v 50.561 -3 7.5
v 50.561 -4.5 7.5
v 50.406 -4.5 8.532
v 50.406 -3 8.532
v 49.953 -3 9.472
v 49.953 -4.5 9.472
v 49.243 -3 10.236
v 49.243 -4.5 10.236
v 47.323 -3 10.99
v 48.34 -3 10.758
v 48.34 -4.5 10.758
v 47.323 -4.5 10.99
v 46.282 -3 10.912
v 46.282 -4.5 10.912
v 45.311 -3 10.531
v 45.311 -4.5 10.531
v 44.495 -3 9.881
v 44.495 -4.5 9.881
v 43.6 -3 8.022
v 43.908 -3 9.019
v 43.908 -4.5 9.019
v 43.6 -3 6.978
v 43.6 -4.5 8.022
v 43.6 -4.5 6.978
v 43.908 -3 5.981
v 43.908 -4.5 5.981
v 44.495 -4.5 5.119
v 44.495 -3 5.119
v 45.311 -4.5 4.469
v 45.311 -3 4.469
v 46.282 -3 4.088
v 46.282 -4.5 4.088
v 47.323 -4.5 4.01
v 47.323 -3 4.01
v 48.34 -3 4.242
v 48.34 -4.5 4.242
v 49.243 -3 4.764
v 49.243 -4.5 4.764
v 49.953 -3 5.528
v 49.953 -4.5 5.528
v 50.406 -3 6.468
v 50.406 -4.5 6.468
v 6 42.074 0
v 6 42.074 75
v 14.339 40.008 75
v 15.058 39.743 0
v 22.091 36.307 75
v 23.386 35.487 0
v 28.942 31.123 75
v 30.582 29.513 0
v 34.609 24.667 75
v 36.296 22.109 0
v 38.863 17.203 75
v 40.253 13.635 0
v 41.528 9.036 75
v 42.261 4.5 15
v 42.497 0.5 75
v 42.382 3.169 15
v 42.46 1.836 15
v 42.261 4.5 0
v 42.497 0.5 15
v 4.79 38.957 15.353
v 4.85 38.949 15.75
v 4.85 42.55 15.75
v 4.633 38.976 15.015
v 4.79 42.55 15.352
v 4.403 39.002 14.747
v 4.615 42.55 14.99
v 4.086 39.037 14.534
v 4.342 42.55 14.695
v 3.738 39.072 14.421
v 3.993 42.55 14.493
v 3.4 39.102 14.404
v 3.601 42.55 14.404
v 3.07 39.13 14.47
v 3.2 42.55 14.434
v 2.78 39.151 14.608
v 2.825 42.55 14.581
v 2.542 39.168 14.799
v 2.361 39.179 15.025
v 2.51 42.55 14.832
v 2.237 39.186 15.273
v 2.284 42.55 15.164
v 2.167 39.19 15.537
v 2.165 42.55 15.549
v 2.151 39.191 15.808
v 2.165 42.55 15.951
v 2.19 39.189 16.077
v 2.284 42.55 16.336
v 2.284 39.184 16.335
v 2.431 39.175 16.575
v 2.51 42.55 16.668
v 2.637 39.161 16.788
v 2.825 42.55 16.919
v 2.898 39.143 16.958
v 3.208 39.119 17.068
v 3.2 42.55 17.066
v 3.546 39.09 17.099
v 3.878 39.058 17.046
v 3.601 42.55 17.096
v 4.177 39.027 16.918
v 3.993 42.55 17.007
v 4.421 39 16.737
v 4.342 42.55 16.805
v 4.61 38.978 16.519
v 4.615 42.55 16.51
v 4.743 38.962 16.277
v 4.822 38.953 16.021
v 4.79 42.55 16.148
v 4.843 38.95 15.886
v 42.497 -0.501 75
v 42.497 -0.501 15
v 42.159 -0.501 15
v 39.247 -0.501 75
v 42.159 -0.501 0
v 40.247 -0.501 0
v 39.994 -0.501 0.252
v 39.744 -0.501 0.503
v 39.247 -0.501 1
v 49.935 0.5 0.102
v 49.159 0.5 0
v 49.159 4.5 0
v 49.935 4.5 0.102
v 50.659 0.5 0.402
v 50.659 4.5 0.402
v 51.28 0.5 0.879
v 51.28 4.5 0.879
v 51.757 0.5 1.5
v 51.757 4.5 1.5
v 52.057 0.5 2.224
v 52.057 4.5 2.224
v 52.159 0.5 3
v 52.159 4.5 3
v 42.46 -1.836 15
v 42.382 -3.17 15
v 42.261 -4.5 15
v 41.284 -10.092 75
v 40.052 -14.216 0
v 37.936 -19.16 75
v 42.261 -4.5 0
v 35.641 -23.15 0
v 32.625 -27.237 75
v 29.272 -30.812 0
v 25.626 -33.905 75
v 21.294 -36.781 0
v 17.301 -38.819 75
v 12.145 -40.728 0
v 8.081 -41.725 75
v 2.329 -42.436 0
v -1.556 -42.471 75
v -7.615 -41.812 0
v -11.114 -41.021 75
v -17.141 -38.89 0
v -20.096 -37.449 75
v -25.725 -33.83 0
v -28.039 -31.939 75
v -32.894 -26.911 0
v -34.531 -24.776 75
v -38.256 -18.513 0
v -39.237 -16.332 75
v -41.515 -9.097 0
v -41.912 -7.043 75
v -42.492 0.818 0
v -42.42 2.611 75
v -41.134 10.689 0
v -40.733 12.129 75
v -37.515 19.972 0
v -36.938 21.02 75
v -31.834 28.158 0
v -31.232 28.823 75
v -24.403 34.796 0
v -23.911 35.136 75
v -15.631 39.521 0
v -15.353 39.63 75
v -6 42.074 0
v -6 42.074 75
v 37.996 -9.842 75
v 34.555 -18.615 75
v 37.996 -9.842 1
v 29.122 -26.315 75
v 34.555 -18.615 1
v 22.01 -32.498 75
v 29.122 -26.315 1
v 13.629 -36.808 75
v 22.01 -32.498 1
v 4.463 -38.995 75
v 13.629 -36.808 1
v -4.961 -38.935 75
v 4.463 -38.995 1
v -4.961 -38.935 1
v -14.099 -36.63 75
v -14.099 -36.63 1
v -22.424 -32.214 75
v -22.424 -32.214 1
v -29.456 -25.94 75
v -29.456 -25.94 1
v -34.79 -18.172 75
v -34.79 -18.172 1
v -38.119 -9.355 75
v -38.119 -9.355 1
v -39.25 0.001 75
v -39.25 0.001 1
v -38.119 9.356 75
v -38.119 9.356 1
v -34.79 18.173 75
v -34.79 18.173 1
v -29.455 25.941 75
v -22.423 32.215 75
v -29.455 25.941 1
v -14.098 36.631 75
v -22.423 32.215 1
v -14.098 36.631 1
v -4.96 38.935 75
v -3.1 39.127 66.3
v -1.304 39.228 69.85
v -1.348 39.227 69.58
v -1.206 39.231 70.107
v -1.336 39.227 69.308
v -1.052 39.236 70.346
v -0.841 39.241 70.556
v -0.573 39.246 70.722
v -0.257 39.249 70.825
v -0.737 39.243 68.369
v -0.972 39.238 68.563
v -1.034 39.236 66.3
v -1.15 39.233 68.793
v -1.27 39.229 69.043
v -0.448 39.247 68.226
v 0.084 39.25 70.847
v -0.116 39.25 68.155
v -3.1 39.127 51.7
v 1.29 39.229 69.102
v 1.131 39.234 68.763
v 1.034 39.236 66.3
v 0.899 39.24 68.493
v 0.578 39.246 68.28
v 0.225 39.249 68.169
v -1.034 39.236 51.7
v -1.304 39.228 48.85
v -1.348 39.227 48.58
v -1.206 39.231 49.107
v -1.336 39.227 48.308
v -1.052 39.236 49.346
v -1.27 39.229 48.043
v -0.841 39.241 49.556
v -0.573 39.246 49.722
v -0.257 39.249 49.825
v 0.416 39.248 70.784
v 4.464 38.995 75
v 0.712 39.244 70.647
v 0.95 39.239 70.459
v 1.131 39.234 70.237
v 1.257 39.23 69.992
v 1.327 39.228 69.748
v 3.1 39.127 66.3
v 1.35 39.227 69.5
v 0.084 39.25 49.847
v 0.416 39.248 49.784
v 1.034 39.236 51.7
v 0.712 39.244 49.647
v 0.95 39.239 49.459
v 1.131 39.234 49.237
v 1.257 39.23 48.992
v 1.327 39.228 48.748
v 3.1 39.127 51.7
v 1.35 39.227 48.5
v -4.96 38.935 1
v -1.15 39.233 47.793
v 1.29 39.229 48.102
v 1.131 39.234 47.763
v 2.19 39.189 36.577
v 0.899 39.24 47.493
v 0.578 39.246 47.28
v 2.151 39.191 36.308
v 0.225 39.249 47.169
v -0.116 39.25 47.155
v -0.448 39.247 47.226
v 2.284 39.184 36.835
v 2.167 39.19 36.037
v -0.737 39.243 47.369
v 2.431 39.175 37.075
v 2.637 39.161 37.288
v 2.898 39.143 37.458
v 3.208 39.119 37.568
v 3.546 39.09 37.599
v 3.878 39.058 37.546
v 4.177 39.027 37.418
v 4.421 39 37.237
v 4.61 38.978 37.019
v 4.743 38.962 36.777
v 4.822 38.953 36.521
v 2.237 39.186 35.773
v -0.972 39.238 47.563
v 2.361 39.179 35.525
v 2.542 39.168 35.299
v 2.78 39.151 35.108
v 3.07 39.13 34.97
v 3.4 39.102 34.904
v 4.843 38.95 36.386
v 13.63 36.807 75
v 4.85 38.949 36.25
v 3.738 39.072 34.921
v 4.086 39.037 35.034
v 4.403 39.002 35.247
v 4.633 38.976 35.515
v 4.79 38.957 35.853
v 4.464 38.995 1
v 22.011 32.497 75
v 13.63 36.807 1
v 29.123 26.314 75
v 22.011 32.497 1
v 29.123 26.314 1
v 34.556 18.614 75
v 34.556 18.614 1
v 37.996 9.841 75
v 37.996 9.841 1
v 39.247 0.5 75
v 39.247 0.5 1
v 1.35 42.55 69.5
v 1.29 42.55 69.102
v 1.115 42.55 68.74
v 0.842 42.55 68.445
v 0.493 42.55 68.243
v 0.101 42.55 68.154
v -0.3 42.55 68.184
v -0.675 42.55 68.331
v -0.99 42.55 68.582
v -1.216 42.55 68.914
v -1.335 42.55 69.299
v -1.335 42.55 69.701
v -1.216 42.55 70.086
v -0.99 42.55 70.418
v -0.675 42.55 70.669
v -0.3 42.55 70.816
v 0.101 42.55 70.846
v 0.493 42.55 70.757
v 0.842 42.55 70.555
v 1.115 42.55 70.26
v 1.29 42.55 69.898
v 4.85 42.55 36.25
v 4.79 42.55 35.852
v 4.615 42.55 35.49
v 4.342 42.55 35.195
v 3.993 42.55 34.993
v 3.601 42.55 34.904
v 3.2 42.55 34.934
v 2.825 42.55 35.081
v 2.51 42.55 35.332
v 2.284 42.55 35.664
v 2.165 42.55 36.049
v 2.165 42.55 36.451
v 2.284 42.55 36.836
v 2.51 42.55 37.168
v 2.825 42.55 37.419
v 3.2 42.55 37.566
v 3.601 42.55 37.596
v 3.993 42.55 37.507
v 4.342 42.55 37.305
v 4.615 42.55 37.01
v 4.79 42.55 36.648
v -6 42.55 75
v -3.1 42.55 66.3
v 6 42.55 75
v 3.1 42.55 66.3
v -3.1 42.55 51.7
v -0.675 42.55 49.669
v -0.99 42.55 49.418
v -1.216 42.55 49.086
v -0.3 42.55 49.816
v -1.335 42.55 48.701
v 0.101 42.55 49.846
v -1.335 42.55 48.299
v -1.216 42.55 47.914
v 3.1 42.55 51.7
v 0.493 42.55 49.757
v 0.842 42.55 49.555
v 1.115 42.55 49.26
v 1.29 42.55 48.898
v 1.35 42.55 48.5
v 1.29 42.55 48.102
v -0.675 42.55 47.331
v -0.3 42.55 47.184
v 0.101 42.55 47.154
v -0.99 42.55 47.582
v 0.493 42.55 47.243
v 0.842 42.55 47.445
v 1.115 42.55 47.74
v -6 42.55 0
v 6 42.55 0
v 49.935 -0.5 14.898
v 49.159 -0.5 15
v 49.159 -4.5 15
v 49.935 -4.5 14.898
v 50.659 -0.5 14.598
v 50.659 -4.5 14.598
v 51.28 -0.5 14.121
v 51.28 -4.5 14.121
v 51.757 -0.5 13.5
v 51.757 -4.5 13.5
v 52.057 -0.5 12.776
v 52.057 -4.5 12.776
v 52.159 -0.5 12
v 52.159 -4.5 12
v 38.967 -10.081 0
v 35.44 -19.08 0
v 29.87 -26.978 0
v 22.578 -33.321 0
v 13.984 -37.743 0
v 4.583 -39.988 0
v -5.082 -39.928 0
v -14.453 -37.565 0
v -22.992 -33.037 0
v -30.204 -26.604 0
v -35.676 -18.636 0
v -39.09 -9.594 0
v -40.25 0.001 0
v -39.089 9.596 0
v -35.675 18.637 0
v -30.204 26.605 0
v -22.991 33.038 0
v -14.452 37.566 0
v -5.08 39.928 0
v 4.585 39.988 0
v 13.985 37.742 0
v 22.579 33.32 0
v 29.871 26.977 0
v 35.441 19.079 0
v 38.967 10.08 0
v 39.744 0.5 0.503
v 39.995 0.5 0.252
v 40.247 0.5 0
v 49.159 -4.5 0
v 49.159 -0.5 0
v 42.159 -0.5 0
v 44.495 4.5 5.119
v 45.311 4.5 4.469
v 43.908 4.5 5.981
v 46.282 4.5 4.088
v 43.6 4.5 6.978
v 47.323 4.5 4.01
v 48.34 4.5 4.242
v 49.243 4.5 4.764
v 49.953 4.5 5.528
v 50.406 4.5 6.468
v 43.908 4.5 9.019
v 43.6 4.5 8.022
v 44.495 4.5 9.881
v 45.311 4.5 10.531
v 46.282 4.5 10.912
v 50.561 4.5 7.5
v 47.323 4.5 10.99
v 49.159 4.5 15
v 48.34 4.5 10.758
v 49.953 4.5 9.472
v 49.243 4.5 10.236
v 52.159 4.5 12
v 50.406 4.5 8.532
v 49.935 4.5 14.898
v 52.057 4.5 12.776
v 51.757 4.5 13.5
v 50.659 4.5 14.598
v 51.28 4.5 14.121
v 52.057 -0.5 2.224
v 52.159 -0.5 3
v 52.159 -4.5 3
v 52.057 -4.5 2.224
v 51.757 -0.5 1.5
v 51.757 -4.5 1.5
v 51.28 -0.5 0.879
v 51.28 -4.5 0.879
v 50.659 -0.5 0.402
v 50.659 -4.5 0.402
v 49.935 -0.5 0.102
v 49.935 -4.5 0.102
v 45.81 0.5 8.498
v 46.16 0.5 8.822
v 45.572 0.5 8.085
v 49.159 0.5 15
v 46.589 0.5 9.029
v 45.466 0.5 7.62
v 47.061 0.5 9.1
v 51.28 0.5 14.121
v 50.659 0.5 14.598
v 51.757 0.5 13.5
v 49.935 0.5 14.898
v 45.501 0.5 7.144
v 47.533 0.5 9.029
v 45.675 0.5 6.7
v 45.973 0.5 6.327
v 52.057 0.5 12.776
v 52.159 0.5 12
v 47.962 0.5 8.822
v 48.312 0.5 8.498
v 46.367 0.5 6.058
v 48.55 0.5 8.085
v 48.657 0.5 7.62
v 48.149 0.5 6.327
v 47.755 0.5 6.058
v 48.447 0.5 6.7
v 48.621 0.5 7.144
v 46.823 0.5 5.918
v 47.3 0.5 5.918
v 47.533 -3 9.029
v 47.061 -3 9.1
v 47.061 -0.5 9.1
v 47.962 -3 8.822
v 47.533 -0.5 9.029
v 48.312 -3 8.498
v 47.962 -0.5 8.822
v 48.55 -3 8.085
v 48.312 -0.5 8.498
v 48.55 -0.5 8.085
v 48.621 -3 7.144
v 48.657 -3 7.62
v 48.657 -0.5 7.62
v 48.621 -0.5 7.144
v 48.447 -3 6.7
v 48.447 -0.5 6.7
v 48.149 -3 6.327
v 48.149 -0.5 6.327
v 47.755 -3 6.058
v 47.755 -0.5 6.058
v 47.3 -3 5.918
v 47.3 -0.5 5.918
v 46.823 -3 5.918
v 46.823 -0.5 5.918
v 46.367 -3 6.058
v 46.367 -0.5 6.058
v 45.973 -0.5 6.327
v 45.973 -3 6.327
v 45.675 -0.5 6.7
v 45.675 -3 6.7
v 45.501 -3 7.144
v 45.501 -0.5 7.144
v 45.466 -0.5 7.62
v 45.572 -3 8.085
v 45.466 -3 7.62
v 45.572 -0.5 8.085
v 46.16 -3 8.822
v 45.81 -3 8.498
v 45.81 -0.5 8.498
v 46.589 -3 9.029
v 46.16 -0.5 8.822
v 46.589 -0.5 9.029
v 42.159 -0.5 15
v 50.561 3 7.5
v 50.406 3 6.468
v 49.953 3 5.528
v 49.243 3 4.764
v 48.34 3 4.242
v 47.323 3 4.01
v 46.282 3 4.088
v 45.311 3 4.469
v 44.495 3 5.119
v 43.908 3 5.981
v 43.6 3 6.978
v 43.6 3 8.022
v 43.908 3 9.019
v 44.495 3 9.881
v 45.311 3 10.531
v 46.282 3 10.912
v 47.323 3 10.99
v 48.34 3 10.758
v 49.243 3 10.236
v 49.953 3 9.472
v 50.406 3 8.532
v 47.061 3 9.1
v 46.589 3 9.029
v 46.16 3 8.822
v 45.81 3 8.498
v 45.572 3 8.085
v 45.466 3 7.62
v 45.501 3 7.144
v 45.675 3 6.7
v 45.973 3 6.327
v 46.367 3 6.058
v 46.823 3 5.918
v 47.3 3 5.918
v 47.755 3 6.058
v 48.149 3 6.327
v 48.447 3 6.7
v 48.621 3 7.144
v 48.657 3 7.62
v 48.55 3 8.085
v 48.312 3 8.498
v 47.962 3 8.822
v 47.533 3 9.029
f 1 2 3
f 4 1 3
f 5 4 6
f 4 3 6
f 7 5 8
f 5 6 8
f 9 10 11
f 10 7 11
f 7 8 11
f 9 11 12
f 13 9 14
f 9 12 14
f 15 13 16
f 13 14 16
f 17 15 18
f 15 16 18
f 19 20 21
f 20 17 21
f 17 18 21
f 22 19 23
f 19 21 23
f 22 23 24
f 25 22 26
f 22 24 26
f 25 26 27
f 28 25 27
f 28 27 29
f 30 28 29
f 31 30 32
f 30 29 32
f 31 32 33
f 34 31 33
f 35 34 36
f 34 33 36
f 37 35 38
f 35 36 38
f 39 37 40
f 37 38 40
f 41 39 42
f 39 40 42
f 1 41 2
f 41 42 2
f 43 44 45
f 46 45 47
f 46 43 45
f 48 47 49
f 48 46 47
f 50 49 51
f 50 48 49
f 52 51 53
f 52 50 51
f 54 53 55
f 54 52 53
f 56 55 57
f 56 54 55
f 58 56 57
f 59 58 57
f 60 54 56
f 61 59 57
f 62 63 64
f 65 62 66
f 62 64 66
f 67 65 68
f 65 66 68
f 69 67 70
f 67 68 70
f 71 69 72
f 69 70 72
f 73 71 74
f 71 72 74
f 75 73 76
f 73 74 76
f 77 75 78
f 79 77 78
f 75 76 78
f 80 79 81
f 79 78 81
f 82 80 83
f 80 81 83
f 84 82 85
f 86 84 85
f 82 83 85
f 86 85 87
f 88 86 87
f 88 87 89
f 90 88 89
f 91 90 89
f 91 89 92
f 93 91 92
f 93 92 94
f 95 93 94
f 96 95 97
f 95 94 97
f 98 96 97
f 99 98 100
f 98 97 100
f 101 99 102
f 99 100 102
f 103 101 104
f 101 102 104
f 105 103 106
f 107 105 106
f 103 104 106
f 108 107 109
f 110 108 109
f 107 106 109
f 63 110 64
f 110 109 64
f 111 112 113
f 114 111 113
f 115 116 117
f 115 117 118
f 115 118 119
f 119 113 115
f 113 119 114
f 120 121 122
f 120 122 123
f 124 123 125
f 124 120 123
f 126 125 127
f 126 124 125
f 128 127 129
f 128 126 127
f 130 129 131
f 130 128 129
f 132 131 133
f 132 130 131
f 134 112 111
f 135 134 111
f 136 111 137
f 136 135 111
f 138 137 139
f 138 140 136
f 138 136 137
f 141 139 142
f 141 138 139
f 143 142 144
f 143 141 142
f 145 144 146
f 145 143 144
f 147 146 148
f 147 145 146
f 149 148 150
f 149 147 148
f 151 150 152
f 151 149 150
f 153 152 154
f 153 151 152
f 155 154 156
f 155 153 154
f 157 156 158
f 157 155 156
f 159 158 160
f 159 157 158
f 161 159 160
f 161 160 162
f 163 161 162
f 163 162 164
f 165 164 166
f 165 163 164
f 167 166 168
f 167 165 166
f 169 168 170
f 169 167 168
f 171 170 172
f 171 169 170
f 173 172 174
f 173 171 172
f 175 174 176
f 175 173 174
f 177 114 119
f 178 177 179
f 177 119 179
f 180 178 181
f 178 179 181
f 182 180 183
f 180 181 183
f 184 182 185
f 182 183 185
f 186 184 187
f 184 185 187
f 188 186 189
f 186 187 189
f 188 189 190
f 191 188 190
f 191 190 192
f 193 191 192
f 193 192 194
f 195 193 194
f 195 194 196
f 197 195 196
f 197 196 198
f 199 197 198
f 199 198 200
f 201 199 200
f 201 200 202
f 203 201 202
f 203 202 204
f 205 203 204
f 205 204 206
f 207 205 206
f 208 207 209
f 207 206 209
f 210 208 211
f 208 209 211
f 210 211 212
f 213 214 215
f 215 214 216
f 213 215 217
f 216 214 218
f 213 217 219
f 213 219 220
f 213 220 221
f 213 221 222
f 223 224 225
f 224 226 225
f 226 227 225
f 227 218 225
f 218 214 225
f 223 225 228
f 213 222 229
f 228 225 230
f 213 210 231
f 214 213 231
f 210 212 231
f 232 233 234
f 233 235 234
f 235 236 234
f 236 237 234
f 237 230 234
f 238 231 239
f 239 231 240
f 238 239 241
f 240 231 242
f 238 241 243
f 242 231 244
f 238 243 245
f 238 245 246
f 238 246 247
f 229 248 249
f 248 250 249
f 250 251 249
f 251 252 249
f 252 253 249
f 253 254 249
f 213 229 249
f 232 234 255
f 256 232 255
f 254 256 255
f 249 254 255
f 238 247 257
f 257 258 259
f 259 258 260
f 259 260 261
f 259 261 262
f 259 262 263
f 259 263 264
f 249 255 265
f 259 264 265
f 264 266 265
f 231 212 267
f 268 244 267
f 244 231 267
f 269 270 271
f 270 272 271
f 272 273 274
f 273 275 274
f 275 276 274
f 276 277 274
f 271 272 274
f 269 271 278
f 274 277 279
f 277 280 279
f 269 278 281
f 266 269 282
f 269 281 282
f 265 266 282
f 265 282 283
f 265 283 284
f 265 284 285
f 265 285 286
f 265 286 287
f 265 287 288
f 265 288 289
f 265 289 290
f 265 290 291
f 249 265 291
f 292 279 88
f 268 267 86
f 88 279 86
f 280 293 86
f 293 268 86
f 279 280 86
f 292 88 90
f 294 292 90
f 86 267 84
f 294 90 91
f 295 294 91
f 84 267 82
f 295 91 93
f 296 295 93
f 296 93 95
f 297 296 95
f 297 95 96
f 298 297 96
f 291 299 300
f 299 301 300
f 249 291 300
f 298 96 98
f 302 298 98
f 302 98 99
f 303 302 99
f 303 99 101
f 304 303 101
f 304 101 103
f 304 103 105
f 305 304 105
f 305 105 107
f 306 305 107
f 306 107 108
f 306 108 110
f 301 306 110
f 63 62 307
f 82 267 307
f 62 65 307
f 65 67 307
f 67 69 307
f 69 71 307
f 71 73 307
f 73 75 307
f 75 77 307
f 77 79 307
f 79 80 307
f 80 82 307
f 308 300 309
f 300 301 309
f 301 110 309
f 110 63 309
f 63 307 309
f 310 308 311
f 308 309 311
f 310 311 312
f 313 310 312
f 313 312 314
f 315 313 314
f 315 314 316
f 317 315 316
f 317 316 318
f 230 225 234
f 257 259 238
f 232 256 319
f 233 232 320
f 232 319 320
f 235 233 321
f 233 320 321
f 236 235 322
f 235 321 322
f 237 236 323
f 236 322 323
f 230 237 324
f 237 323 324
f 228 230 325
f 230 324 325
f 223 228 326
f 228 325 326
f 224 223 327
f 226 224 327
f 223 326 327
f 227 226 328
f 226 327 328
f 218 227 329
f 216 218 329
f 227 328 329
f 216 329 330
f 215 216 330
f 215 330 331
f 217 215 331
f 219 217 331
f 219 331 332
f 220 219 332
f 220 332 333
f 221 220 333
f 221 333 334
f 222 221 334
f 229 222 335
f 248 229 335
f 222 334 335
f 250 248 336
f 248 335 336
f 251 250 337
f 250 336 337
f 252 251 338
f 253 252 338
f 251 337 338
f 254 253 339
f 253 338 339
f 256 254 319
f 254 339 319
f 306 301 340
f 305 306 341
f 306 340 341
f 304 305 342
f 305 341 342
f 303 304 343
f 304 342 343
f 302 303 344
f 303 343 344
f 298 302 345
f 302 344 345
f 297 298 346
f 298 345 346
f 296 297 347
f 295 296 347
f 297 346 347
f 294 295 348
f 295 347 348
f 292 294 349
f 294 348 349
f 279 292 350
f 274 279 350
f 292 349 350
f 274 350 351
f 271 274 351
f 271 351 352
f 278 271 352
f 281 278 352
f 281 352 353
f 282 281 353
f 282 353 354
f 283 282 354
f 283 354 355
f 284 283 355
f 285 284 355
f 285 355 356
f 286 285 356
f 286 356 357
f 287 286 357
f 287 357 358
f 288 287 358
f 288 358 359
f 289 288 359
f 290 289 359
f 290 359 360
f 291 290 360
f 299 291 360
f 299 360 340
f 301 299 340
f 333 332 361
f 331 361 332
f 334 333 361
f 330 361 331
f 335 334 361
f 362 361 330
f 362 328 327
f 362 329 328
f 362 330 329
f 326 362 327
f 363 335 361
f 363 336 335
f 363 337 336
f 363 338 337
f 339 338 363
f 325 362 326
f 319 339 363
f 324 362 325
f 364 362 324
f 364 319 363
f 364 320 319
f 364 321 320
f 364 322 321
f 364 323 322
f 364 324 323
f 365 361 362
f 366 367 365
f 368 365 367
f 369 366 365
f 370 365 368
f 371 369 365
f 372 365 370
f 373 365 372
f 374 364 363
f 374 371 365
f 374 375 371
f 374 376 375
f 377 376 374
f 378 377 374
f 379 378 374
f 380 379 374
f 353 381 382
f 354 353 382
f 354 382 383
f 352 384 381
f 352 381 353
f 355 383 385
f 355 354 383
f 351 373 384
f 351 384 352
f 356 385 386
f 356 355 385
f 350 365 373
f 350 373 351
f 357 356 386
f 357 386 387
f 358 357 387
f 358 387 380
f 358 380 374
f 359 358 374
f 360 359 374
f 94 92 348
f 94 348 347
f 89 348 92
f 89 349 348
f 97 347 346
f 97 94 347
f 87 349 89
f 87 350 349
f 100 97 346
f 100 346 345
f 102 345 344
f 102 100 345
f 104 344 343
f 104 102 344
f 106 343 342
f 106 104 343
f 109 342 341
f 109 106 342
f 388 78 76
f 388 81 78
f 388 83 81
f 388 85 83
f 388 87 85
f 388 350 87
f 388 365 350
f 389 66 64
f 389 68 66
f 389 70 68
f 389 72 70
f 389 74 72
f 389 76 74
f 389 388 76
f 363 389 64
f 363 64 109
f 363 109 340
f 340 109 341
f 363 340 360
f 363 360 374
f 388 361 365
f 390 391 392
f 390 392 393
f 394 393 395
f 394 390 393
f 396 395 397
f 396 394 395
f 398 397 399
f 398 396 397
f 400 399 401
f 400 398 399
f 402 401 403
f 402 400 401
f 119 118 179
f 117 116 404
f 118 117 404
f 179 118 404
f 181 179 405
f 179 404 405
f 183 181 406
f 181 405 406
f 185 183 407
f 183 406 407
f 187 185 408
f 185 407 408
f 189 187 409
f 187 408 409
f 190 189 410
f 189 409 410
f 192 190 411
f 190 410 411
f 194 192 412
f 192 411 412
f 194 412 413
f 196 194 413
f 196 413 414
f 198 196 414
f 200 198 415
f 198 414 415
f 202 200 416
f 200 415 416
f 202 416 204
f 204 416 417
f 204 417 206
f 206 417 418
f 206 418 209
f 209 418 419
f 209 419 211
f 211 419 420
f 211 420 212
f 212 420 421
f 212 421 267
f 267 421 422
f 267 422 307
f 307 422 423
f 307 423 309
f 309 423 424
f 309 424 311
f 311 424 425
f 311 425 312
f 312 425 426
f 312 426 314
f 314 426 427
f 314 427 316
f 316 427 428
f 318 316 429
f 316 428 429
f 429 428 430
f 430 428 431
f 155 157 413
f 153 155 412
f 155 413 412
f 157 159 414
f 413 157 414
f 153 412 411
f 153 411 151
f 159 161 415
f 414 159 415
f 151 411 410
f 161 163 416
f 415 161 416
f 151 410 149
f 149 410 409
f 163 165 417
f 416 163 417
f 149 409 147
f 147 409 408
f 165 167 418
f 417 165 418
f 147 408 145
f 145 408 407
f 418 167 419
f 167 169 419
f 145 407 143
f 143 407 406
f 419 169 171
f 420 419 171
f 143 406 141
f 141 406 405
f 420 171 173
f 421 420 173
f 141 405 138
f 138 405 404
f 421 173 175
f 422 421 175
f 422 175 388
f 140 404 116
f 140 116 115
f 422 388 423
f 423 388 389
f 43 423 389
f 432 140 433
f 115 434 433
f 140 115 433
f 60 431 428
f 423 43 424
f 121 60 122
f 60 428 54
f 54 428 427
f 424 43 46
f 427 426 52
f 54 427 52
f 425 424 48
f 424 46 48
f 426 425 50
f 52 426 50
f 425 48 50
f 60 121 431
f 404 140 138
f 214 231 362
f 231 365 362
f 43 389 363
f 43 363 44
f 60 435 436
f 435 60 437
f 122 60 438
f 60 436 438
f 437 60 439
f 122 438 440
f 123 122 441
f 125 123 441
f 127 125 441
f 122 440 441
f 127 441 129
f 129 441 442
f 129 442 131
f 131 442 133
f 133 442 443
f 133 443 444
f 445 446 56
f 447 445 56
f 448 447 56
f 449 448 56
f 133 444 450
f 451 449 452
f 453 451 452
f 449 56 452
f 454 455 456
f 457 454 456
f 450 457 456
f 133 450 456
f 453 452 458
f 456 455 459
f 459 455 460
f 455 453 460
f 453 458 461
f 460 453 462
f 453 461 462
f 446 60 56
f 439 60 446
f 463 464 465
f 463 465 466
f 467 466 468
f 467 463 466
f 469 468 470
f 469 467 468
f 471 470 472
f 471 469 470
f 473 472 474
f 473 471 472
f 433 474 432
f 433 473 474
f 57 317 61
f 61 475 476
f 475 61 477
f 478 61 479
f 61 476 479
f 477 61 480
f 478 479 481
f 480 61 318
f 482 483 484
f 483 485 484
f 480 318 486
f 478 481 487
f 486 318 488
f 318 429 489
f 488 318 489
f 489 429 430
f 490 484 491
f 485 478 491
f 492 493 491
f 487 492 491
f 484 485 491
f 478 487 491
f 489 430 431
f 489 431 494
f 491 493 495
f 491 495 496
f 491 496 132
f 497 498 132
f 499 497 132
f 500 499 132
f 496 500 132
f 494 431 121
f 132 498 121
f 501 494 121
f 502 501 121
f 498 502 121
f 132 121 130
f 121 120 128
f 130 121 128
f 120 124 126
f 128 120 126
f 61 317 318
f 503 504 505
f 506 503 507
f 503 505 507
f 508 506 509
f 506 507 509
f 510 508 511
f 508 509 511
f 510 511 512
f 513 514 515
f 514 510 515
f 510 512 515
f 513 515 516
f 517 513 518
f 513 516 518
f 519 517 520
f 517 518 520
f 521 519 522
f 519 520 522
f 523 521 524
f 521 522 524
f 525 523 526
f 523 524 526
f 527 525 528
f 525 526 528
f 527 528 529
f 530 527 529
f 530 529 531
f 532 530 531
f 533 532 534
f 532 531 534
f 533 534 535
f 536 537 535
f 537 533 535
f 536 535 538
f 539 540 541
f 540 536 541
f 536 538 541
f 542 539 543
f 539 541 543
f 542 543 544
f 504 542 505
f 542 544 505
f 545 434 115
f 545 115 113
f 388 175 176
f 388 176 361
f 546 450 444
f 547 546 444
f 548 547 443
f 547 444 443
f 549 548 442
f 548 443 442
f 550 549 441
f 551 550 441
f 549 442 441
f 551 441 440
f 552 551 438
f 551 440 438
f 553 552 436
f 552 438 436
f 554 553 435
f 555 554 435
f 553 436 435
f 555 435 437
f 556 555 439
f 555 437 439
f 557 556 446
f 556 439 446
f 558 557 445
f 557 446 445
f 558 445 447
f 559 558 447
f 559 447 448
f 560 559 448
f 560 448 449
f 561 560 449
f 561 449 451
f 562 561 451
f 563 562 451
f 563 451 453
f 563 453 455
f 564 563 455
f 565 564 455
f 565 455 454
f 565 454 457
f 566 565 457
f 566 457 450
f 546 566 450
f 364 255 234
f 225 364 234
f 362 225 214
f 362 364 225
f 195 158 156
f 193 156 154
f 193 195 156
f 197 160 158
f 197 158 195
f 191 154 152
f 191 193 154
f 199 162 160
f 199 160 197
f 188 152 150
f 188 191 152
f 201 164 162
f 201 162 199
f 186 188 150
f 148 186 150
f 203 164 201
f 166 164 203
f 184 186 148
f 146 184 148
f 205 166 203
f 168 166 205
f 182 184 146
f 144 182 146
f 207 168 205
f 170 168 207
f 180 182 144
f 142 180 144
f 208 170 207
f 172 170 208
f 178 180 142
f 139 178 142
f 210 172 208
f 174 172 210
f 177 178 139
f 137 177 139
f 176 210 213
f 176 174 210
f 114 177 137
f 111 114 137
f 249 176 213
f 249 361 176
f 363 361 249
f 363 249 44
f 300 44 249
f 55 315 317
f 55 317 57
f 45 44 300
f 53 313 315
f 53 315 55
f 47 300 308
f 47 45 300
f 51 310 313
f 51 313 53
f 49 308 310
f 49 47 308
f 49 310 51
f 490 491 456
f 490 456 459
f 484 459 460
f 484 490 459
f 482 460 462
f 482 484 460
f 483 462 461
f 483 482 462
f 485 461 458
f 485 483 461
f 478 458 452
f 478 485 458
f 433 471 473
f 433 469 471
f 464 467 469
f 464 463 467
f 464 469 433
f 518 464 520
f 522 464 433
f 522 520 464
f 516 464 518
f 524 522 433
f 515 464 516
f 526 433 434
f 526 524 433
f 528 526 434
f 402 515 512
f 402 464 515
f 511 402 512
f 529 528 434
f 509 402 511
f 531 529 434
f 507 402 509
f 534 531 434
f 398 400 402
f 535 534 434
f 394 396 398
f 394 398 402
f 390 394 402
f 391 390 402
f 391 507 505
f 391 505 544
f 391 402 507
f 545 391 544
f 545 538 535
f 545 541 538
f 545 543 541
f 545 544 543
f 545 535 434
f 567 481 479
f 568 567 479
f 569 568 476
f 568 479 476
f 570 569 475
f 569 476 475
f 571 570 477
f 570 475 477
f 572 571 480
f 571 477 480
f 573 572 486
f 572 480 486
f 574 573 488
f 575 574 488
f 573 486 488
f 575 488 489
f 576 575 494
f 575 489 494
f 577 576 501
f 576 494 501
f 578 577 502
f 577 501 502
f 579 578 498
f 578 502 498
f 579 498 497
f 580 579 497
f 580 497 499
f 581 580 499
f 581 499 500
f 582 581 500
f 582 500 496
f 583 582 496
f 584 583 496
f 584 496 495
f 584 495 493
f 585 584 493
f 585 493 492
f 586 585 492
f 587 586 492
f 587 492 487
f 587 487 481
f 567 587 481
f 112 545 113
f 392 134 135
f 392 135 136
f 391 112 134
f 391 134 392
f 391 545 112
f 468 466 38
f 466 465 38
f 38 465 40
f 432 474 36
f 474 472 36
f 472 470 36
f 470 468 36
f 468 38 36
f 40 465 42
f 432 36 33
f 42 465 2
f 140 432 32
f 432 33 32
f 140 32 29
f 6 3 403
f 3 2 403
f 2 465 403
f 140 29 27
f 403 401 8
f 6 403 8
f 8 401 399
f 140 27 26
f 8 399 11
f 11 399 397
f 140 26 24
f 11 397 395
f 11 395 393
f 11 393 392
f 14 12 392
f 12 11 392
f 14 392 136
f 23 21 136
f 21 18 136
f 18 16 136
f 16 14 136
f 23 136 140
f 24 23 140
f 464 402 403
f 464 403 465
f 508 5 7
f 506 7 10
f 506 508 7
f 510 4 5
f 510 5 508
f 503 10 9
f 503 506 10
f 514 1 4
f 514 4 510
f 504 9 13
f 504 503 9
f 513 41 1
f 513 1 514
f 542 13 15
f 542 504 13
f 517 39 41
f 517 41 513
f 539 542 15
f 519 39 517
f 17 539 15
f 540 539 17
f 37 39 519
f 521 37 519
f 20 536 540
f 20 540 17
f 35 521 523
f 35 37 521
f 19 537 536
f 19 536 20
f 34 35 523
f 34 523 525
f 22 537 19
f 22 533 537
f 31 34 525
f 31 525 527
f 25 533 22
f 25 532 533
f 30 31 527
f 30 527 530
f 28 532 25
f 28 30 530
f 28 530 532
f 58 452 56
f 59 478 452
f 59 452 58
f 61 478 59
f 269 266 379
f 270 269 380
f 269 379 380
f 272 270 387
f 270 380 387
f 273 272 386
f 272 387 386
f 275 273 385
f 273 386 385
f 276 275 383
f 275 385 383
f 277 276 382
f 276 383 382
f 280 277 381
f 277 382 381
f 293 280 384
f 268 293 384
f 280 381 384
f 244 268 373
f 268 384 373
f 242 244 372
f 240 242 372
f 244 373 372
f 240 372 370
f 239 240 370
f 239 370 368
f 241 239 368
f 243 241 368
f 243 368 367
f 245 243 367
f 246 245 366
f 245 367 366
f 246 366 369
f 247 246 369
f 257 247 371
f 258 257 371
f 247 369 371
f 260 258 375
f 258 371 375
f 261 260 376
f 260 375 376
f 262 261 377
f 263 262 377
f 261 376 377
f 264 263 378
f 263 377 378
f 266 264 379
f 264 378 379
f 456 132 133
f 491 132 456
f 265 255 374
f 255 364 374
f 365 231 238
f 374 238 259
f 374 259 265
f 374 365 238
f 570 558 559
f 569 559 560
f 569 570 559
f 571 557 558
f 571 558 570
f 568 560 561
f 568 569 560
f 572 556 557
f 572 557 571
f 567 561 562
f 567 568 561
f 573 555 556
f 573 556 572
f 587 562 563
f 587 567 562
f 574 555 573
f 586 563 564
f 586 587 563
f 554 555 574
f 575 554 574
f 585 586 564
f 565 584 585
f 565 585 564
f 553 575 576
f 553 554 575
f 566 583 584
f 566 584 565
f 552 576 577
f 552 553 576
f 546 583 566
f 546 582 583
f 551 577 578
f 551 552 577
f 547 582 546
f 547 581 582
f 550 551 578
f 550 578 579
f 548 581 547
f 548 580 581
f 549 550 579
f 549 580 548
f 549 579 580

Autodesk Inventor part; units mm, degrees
ref_plane "YZ Plane" through (0, 0, 0) normal (1, 0, 0) x (0, 1, 0)
ref_plane "XZ Plane" through (0, 0, 0) normal (0, 1, 0) x (-1, 0, 0)
ref_plane "XY Plane" through (0, 0, 0) normal (0, 0, 1) x (1, 0, 0)
sketch "Sketch1" plane through (0, 0, 0) normal (0, 0, 1) x (1, 0, 0)
  circle A0 centre (0, 0) radius 39.25
  circle A1 centre (0, 0) radius 42.5
  line L0 (39.2468, 0.5) -> (42.4971, 0.5)
  line L1 (44.2943, 0.5) -> (44.2943, -0.5)
  line L2 (42.497, -0.5013) -> (39.2468, -0.5013)
  line L3 (38.2943, -0.5) -> (38.2943, 0.5)
  line L4 (-6, 42.55) -> (6, 42.55)
  line L5 (6, 42.55) -> (6, 38.73)
  line L6 (6, 38.73) -> (-6, 38.73)
  line L7 (-6, 38.73) -> (-6, 42.55)
  point P0 (-6, 42.0743)
  point P1 (6, 42.0743)
  dimension "d0" = 78.5
  dimension "d1" = 85
  dimension "d2" = 6
  dimension "d3" = 1
  dimension "d4" = 0.5
  dimension "d7" = 12
  dimension "d8" = 6
  dimension "d9" = 42.55
extrude "Extrusion1" add sketch "Sketch1" along normal blind 75 contours A0 L5 A1 L0 | L2 A1 L7 A0 | A0 L7 A1 L5 | A1 L7 L4 L5
sketch "Sketch3" plane through (39.2468, 0.5, 0) normal (0, -1, 0) x (1, 0, 0)
  line L0 (3.2502, 0) -> (-33.2468, 0) projected
  line L1 (2.9121, 0) -> (9.9121, 0)
  line L2 (12.9121, 3) -> (12.9121, 12)
  line L3 (9.9121, 15) -> (2.9121, 15)
  line L4 (2.9121, 15) -> (2.9121, 0)
  arc A0 (12.9121, 12) -> (9.9121, 15) centre (9.9121, 12) ccw
  arc A1 (9.9121, 0) -> (12.9121, 3) centre (9.9121, 3) ccw
  point P0 (-39.2468, 0)
  point P1 (12.9121, 15)
  point P2 (12.9121, 0)
  dimension "d10" = 10
  dimension "d11" = 15
  dimension "d12" = 3
extrude "Extrusion2" add sketch "Sketch3" against normal blind 4
sketch "Sketch4" plane through (39.2468, 4.5, 0) normal (0, 1, 0) x (1, 0, 0)
  circle A0 centre (7.8143, -7.5) radius 3.5
  line L0 (9.9121, 0) -> (3.0143, 0) projected
  line L1 (3.0143, -15) -> (3.0143, 0) projected
  point P0 (-39.2468, 0)
  point P1 (3.0143, -7.5)
  dimension "d15" = 7
  dimension "d16" = 7.5
  dimension "d17" = 4.8
extrude "Extrusion3" cut sketch "Sketch4" against normal blind 1.5
sketch "Sketch5" plane through (47.0611, 3, 7.5) normal (0, 1, 0) x (1, 0, 0)
  circle A0 centre (0, 0) radius 3.5 projected
  point P0 (-47.0611, 7.5)
hole "Hole1" at (47.0611, 3, 7.5) direction (0, -1, 0) diameter 3.2 end through all
mirror "Mirror1" about plane through (0, 0, 0) normal (0, 1, 0) of "Extrusion2", "Extrusion3", "Hole1"
sketch "Sketch6" plane through (-6, 42.55, 0) normal (0, 1, 0) x (1, 0, 0)
  line L0 (0, 0) -> (0, -75) projected
  line L1 (12, 0) -> (12, -75) projected
  line L2 (0, -13) -> (12, -13)
  line L3 (12, -13) -> (12, -39)
  line L4 (12, -39) -> (0, -39)
  line L5 (0, -39) -> (0, -13)
  circle A0 centre (9.5, -15.75) radius 1.35
  circle A1 centre (9.5, -36.25) radius 1.35
  line L6 (12, 0) -> (0, 0) projected
  line L7 (2.9, -72) -> (9.1, -72)
  line L8 (9.1, -72) -> (9.1, -46)
  line L9 (9.1, -46) -> (2.9, -46)
  line L10 (2.9, -46) -> (2.9, -72)
  line L11 (12, -75) -> (0, -75) projected
  circle A2 centre (6, -69.5) radius 1.35
  circle A3 centre (6, -48.5) radius 1.35
  line L12 (2.9, -51.7) -> (9.1, -51.7)
  line L13 (9.1, -51.7) -> (9.1, -66.3)
  line L14 (9.1, -66.3) -> (2.9, -66.3)
  line L15 (2.9, -66.3) -> (2.9, -51.7)
  point P0 (6, 0)
  point P1 (6, -46)
  point P2 (2.9, -66.3)
  point P3 (9.1, -51.7)
  dimension "d27" = 26
  dimension "d28" = 2.7
  dimension "d29" = 2.7
  dimension "d30" = 2.75
  dimension "d31" = 2.5
  dimension "d32" = 2.5
  dimension "d33" = 2.75
  dimension "d34" = 13
  dimension "d35" = 6.2
  dimension "d36" = 26
  dimension "d37" = 2.9
  dimension "d38" = 3
  dimension "d39" = 2.7
  dimension "d40" = 2.7
  dimension "d41" = 2.5
  dimension "d42" = 2.5
  dimension "d43" = 3.1
  dimension "d44" = 3.1
  dimension "d47" = 14.6
  dimension "d48" = 5.7
extrude "Extrusion4" cut sketch "Sketch6" against normal blind 6 contours A0 | A1 | L10 L12 L8 L14 | A2 | A3
chamfer "Chamfer1" distance 1 angle 45 1 edges at (-39.25, 0.0006, 0)
equation "\"d8\" = 0.5 * d7"
equation "\"d29\" = d28"
equation "\"d32\" = d31"
equation "\"d33\" = d30"
equation "\"d40\" = d39"
equation "\"d41\" = d42"
equation "\"d44\" = d43"
properties part number "sensor_adapter"
